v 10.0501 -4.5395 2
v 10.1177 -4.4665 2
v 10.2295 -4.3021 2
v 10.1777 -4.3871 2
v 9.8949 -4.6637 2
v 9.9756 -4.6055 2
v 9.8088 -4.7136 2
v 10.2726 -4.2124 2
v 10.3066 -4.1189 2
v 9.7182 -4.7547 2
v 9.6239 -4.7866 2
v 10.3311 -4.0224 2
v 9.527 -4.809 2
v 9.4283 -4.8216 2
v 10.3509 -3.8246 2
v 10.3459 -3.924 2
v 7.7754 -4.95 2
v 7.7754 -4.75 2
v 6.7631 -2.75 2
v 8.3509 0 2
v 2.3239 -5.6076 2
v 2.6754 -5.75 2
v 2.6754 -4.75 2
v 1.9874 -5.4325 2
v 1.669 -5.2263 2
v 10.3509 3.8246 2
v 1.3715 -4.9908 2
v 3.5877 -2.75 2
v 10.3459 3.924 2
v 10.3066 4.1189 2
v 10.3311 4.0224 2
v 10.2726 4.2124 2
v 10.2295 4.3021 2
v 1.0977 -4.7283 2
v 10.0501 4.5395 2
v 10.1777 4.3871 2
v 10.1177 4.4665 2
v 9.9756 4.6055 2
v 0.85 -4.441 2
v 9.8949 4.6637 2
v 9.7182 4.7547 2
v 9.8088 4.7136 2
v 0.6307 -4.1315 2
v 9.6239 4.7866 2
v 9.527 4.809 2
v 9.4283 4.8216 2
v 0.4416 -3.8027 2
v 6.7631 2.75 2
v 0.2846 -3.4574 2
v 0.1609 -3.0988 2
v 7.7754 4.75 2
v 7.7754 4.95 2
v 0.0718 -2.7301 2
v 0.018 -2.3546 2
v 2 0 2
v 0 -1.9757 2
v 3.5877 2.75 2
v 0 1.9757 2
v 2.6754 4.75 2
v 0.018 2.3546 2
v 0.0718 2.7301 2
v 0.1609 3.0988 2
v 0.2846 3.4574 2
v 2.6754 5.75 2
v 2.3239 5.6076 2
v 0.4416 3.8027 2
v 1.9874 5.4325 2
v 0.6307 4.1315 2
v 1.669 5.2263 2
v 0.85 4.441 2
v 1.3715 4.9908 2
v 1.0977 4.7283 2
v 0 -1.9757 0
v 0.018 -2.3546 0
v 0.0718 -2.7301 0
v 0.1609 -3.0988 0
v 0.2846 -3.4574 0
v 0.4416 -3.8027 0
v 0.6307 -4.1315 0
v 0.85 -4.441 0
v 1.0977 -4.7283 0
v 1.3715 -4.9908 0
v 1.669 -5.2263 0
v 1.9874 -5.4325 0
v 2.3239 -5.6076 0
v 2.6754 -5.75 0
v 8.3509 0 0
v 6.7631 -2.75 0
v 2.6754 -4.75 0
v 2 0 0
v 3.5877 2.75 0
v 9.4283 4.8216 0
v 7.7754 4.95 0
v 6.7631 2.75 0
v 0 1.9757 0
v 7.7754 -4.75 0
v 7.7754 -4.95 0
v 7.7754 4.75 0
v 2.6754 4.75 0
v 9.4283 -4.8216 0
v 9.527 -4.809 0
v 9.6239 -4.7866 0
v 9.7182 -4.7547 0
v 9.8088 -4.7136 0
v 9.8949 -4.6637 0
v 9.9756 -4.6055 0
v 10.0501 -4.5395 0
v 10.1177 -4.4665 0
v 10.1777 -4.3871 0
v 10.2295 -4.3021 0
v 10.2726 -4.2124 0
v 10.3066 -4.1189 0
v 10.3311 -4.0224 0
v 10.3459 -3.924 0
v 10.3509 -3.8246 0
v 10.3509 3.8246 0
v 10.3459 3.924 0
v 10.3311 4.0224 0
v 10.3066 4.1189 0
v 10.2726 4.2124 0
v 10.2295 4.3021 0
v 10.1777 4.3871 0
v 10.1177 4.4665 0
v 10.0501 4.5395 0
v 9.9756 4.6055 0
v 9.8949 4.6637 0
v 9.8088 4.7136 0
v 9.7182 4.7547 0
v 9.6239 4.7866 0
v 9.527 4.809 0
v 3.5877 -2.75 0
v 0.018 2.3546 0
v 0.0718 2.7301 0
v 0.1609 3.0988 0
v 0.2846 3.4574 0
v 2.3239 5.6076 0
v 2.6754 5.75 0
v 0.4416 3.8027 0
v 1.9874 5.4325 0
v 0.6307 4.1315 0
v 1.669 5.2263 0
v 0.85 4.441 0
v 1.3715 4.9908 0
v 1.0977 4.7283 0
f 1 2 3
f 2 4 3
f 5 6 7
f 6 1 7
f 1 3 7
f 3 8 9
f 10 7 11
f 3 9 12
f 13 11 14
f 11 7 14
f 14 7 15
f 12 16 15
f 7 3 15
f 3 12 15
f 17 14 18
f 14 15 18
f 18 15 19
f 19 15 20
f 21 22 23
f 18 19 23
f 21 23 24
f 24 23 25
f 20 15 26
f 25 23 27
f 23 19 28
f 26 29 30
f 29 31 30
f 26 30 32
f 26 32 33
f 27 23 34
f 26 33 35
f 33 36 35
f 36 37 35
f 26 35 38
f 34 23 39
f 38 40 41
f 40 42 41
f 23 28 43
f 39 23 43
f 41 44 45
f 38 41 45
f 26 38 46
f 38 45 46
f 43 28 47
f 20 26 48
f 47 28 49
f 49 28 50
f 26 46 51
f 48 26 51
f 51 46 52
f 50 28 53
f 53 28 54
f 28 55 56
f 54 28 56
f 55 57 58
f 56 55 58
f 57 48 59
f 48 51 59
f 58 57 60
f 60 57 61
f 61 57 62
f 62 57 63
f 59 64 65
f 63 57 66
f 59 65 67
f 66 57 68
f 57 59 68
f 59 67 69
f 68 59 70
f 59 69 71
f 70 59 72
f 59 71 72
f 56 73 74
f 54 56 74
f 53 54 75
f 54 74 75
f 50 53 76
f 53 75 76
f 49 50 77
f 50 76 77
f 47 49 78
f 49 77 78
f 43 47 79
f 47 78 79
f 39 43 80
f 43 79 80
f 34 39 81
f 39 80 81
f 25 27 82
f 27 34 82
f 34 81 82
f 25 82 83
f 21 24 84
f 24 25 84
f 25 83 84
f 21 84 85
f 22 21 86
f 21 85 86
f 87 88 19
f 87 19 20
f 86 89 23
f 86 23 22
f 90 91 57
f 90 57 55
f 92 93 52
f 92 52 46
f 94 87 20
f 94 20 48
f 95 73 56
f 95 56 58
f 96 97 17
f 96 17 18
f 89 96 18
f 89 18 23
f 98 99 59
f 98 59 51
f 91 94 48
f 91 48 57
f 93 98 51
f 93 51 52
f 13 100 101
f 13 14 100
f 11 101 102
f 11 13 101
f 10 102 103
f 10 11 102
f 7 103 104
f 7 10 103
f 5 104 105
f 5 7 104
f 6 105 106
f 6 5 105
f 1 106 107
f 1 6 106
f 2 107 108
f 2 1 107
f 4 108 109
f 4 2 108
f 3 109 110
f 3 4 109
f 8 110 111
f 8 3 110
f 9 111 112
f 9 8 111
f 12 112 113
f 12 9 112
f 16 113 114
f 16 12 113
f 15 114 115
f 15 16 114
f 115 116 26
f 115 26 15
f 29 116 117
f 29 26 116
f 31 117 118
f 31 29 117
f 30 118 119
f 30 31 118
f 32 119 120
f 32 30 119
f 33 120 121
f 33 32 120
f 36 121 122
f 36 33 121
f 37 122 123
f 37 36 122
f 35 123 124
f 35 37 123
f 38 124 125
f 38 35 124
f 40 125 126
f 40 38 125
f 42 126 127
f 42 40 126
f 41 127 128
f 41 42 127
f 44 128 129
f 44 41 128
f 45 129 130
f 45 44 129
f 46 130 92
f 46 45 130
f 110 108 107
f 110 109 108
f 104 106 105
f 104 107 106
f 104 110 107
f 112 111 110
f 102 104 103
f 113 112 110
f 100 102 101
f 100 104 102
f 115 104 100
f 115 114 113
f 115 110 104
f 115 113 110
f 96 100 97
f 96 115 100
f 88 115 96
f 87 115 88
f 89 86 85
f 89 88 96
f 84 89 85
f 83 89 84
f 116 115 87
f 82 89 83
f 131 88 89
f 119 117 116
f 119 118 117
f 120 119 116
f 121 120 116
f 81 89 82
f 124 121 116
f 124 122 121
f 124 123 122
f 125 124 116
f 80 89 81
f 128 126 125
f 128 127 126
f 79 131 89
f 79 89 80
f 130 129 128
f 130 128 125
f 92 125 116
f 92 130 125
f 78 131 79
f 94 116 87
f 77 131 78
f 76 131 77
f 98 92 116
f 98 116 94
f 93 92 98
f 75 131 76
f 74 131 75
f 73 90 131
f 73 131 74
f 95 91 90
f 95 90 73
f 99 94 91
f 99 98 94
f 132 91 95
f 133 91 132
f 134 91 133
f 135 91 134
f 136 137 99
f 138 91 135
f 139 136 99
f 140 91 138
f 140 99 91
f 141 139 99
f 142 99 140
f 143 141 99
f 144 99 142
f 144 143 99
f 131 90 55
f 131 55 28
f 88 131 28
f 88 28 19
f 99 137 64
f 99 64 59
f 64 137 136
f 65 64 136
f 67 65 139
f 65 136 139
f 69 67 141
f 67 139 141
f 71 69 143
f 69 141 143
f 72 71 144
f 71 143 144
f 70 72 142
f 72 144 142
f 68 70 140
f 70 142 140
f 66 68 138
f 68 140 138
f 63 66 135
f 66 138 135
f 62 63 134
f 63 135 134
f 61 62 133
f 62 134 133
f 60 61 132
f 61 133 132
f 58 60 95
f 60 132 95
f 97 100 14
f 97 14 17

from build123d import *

# Parameters (mm, degrees)
BOSS_EXTRU_1_DEPTH = 2
CONG_1_R           = 4
CONG_2_R           = 1


with BuildPart() as part:
    # Esquisse1 → Boss.-Extru.1 (new body)
    with BuildSketch(Plane.XY):
        Polygon((0, 5.75), (2.675426481, 5.75), (2.675426481, 4.75), (7.775426481, 4.75), (7.775426481, 4.95), (10.350852961, 4.75), (10.350852961, -4.75), (7.775426481, -4.95), (7.775426481, -4.75), (2.675426481, -4.75), (2.675426481, -5.75), (0, -5.75), align=None)
        Polygon((2, 0), (3.58771324, -2.75), (6.763139721, -2.75), (8.350852961, 0), (6.763139721, 2.75), (3.58771324, 2.75), align=None, mode=Mode.SUBTRACT)
    extrude(amount=BOSS_EXTRU_1_DEPTH)

    # Congé1
    # the kernel refuses this fillet: 4 mm, written as the material it takes off along each edge
    with BuildSketch(Plane(origin=(0, -5.75, -9.435804481), x_dir=(1, 0, 0), z_dir=(0, 0, 1))) as cong_1_piece_1:
        with BuildLine():
            CenterArc((4, 3.774321792), CONG_1_R, 180, 70.661811314)
            Line((0, 3.774321792), (-0.08, 3.774321792))
            Line((-0.08, 3.774321792), (-0.08, 0))
            Line((-0.08, 0), (0, -0.08))
            ThreePointArc((0, -0.08), (1.33771324, -0.08), (2.64893501, -0.075486436))
            Line((2.64893501, -0.075486436), (2.675426481, 0))
        make_face()
    extrude(amount=20.871608961, mode=Mode.SUBTRACT)
    with BuildSketch(Plane(origin=(0, 5.75, -9.435804481), x_dir=(1, 0, 0), z_dir=(0, 0, 1))) as cong_1_piece_2:
        with BuildLine():
            CenterArc((4, -3.774321792), CONG_1_R, 109.338188686, 70.661811314)
            Line((0, -3.774321792), (-0.08, -3.774321792))
            Line((-0.08, -3.774321792), (-0.08, 0))
            Line((-0.08, 0), (0, 0.08))
            ThreePointArc((0, 0.08), (1.33771324, 0.08), (2.64893501, 0.075486436))
            Line((2.64893501, 0.075486436), (2.675426481, 0))
        make_face()
    extrude(amount=20.871608961, mode=Mode.SUBTRACT)

    # Congé2
    cong_2_edges = [part.edges().sort_by_distance(p)[0] for p in [
        (10.350852961, 4.75, 1),
        (10.350852961, -4.75, 1),
    ]]
    fillet(cong_2_edges, radius=CONG_2_R)


solid = part.part
